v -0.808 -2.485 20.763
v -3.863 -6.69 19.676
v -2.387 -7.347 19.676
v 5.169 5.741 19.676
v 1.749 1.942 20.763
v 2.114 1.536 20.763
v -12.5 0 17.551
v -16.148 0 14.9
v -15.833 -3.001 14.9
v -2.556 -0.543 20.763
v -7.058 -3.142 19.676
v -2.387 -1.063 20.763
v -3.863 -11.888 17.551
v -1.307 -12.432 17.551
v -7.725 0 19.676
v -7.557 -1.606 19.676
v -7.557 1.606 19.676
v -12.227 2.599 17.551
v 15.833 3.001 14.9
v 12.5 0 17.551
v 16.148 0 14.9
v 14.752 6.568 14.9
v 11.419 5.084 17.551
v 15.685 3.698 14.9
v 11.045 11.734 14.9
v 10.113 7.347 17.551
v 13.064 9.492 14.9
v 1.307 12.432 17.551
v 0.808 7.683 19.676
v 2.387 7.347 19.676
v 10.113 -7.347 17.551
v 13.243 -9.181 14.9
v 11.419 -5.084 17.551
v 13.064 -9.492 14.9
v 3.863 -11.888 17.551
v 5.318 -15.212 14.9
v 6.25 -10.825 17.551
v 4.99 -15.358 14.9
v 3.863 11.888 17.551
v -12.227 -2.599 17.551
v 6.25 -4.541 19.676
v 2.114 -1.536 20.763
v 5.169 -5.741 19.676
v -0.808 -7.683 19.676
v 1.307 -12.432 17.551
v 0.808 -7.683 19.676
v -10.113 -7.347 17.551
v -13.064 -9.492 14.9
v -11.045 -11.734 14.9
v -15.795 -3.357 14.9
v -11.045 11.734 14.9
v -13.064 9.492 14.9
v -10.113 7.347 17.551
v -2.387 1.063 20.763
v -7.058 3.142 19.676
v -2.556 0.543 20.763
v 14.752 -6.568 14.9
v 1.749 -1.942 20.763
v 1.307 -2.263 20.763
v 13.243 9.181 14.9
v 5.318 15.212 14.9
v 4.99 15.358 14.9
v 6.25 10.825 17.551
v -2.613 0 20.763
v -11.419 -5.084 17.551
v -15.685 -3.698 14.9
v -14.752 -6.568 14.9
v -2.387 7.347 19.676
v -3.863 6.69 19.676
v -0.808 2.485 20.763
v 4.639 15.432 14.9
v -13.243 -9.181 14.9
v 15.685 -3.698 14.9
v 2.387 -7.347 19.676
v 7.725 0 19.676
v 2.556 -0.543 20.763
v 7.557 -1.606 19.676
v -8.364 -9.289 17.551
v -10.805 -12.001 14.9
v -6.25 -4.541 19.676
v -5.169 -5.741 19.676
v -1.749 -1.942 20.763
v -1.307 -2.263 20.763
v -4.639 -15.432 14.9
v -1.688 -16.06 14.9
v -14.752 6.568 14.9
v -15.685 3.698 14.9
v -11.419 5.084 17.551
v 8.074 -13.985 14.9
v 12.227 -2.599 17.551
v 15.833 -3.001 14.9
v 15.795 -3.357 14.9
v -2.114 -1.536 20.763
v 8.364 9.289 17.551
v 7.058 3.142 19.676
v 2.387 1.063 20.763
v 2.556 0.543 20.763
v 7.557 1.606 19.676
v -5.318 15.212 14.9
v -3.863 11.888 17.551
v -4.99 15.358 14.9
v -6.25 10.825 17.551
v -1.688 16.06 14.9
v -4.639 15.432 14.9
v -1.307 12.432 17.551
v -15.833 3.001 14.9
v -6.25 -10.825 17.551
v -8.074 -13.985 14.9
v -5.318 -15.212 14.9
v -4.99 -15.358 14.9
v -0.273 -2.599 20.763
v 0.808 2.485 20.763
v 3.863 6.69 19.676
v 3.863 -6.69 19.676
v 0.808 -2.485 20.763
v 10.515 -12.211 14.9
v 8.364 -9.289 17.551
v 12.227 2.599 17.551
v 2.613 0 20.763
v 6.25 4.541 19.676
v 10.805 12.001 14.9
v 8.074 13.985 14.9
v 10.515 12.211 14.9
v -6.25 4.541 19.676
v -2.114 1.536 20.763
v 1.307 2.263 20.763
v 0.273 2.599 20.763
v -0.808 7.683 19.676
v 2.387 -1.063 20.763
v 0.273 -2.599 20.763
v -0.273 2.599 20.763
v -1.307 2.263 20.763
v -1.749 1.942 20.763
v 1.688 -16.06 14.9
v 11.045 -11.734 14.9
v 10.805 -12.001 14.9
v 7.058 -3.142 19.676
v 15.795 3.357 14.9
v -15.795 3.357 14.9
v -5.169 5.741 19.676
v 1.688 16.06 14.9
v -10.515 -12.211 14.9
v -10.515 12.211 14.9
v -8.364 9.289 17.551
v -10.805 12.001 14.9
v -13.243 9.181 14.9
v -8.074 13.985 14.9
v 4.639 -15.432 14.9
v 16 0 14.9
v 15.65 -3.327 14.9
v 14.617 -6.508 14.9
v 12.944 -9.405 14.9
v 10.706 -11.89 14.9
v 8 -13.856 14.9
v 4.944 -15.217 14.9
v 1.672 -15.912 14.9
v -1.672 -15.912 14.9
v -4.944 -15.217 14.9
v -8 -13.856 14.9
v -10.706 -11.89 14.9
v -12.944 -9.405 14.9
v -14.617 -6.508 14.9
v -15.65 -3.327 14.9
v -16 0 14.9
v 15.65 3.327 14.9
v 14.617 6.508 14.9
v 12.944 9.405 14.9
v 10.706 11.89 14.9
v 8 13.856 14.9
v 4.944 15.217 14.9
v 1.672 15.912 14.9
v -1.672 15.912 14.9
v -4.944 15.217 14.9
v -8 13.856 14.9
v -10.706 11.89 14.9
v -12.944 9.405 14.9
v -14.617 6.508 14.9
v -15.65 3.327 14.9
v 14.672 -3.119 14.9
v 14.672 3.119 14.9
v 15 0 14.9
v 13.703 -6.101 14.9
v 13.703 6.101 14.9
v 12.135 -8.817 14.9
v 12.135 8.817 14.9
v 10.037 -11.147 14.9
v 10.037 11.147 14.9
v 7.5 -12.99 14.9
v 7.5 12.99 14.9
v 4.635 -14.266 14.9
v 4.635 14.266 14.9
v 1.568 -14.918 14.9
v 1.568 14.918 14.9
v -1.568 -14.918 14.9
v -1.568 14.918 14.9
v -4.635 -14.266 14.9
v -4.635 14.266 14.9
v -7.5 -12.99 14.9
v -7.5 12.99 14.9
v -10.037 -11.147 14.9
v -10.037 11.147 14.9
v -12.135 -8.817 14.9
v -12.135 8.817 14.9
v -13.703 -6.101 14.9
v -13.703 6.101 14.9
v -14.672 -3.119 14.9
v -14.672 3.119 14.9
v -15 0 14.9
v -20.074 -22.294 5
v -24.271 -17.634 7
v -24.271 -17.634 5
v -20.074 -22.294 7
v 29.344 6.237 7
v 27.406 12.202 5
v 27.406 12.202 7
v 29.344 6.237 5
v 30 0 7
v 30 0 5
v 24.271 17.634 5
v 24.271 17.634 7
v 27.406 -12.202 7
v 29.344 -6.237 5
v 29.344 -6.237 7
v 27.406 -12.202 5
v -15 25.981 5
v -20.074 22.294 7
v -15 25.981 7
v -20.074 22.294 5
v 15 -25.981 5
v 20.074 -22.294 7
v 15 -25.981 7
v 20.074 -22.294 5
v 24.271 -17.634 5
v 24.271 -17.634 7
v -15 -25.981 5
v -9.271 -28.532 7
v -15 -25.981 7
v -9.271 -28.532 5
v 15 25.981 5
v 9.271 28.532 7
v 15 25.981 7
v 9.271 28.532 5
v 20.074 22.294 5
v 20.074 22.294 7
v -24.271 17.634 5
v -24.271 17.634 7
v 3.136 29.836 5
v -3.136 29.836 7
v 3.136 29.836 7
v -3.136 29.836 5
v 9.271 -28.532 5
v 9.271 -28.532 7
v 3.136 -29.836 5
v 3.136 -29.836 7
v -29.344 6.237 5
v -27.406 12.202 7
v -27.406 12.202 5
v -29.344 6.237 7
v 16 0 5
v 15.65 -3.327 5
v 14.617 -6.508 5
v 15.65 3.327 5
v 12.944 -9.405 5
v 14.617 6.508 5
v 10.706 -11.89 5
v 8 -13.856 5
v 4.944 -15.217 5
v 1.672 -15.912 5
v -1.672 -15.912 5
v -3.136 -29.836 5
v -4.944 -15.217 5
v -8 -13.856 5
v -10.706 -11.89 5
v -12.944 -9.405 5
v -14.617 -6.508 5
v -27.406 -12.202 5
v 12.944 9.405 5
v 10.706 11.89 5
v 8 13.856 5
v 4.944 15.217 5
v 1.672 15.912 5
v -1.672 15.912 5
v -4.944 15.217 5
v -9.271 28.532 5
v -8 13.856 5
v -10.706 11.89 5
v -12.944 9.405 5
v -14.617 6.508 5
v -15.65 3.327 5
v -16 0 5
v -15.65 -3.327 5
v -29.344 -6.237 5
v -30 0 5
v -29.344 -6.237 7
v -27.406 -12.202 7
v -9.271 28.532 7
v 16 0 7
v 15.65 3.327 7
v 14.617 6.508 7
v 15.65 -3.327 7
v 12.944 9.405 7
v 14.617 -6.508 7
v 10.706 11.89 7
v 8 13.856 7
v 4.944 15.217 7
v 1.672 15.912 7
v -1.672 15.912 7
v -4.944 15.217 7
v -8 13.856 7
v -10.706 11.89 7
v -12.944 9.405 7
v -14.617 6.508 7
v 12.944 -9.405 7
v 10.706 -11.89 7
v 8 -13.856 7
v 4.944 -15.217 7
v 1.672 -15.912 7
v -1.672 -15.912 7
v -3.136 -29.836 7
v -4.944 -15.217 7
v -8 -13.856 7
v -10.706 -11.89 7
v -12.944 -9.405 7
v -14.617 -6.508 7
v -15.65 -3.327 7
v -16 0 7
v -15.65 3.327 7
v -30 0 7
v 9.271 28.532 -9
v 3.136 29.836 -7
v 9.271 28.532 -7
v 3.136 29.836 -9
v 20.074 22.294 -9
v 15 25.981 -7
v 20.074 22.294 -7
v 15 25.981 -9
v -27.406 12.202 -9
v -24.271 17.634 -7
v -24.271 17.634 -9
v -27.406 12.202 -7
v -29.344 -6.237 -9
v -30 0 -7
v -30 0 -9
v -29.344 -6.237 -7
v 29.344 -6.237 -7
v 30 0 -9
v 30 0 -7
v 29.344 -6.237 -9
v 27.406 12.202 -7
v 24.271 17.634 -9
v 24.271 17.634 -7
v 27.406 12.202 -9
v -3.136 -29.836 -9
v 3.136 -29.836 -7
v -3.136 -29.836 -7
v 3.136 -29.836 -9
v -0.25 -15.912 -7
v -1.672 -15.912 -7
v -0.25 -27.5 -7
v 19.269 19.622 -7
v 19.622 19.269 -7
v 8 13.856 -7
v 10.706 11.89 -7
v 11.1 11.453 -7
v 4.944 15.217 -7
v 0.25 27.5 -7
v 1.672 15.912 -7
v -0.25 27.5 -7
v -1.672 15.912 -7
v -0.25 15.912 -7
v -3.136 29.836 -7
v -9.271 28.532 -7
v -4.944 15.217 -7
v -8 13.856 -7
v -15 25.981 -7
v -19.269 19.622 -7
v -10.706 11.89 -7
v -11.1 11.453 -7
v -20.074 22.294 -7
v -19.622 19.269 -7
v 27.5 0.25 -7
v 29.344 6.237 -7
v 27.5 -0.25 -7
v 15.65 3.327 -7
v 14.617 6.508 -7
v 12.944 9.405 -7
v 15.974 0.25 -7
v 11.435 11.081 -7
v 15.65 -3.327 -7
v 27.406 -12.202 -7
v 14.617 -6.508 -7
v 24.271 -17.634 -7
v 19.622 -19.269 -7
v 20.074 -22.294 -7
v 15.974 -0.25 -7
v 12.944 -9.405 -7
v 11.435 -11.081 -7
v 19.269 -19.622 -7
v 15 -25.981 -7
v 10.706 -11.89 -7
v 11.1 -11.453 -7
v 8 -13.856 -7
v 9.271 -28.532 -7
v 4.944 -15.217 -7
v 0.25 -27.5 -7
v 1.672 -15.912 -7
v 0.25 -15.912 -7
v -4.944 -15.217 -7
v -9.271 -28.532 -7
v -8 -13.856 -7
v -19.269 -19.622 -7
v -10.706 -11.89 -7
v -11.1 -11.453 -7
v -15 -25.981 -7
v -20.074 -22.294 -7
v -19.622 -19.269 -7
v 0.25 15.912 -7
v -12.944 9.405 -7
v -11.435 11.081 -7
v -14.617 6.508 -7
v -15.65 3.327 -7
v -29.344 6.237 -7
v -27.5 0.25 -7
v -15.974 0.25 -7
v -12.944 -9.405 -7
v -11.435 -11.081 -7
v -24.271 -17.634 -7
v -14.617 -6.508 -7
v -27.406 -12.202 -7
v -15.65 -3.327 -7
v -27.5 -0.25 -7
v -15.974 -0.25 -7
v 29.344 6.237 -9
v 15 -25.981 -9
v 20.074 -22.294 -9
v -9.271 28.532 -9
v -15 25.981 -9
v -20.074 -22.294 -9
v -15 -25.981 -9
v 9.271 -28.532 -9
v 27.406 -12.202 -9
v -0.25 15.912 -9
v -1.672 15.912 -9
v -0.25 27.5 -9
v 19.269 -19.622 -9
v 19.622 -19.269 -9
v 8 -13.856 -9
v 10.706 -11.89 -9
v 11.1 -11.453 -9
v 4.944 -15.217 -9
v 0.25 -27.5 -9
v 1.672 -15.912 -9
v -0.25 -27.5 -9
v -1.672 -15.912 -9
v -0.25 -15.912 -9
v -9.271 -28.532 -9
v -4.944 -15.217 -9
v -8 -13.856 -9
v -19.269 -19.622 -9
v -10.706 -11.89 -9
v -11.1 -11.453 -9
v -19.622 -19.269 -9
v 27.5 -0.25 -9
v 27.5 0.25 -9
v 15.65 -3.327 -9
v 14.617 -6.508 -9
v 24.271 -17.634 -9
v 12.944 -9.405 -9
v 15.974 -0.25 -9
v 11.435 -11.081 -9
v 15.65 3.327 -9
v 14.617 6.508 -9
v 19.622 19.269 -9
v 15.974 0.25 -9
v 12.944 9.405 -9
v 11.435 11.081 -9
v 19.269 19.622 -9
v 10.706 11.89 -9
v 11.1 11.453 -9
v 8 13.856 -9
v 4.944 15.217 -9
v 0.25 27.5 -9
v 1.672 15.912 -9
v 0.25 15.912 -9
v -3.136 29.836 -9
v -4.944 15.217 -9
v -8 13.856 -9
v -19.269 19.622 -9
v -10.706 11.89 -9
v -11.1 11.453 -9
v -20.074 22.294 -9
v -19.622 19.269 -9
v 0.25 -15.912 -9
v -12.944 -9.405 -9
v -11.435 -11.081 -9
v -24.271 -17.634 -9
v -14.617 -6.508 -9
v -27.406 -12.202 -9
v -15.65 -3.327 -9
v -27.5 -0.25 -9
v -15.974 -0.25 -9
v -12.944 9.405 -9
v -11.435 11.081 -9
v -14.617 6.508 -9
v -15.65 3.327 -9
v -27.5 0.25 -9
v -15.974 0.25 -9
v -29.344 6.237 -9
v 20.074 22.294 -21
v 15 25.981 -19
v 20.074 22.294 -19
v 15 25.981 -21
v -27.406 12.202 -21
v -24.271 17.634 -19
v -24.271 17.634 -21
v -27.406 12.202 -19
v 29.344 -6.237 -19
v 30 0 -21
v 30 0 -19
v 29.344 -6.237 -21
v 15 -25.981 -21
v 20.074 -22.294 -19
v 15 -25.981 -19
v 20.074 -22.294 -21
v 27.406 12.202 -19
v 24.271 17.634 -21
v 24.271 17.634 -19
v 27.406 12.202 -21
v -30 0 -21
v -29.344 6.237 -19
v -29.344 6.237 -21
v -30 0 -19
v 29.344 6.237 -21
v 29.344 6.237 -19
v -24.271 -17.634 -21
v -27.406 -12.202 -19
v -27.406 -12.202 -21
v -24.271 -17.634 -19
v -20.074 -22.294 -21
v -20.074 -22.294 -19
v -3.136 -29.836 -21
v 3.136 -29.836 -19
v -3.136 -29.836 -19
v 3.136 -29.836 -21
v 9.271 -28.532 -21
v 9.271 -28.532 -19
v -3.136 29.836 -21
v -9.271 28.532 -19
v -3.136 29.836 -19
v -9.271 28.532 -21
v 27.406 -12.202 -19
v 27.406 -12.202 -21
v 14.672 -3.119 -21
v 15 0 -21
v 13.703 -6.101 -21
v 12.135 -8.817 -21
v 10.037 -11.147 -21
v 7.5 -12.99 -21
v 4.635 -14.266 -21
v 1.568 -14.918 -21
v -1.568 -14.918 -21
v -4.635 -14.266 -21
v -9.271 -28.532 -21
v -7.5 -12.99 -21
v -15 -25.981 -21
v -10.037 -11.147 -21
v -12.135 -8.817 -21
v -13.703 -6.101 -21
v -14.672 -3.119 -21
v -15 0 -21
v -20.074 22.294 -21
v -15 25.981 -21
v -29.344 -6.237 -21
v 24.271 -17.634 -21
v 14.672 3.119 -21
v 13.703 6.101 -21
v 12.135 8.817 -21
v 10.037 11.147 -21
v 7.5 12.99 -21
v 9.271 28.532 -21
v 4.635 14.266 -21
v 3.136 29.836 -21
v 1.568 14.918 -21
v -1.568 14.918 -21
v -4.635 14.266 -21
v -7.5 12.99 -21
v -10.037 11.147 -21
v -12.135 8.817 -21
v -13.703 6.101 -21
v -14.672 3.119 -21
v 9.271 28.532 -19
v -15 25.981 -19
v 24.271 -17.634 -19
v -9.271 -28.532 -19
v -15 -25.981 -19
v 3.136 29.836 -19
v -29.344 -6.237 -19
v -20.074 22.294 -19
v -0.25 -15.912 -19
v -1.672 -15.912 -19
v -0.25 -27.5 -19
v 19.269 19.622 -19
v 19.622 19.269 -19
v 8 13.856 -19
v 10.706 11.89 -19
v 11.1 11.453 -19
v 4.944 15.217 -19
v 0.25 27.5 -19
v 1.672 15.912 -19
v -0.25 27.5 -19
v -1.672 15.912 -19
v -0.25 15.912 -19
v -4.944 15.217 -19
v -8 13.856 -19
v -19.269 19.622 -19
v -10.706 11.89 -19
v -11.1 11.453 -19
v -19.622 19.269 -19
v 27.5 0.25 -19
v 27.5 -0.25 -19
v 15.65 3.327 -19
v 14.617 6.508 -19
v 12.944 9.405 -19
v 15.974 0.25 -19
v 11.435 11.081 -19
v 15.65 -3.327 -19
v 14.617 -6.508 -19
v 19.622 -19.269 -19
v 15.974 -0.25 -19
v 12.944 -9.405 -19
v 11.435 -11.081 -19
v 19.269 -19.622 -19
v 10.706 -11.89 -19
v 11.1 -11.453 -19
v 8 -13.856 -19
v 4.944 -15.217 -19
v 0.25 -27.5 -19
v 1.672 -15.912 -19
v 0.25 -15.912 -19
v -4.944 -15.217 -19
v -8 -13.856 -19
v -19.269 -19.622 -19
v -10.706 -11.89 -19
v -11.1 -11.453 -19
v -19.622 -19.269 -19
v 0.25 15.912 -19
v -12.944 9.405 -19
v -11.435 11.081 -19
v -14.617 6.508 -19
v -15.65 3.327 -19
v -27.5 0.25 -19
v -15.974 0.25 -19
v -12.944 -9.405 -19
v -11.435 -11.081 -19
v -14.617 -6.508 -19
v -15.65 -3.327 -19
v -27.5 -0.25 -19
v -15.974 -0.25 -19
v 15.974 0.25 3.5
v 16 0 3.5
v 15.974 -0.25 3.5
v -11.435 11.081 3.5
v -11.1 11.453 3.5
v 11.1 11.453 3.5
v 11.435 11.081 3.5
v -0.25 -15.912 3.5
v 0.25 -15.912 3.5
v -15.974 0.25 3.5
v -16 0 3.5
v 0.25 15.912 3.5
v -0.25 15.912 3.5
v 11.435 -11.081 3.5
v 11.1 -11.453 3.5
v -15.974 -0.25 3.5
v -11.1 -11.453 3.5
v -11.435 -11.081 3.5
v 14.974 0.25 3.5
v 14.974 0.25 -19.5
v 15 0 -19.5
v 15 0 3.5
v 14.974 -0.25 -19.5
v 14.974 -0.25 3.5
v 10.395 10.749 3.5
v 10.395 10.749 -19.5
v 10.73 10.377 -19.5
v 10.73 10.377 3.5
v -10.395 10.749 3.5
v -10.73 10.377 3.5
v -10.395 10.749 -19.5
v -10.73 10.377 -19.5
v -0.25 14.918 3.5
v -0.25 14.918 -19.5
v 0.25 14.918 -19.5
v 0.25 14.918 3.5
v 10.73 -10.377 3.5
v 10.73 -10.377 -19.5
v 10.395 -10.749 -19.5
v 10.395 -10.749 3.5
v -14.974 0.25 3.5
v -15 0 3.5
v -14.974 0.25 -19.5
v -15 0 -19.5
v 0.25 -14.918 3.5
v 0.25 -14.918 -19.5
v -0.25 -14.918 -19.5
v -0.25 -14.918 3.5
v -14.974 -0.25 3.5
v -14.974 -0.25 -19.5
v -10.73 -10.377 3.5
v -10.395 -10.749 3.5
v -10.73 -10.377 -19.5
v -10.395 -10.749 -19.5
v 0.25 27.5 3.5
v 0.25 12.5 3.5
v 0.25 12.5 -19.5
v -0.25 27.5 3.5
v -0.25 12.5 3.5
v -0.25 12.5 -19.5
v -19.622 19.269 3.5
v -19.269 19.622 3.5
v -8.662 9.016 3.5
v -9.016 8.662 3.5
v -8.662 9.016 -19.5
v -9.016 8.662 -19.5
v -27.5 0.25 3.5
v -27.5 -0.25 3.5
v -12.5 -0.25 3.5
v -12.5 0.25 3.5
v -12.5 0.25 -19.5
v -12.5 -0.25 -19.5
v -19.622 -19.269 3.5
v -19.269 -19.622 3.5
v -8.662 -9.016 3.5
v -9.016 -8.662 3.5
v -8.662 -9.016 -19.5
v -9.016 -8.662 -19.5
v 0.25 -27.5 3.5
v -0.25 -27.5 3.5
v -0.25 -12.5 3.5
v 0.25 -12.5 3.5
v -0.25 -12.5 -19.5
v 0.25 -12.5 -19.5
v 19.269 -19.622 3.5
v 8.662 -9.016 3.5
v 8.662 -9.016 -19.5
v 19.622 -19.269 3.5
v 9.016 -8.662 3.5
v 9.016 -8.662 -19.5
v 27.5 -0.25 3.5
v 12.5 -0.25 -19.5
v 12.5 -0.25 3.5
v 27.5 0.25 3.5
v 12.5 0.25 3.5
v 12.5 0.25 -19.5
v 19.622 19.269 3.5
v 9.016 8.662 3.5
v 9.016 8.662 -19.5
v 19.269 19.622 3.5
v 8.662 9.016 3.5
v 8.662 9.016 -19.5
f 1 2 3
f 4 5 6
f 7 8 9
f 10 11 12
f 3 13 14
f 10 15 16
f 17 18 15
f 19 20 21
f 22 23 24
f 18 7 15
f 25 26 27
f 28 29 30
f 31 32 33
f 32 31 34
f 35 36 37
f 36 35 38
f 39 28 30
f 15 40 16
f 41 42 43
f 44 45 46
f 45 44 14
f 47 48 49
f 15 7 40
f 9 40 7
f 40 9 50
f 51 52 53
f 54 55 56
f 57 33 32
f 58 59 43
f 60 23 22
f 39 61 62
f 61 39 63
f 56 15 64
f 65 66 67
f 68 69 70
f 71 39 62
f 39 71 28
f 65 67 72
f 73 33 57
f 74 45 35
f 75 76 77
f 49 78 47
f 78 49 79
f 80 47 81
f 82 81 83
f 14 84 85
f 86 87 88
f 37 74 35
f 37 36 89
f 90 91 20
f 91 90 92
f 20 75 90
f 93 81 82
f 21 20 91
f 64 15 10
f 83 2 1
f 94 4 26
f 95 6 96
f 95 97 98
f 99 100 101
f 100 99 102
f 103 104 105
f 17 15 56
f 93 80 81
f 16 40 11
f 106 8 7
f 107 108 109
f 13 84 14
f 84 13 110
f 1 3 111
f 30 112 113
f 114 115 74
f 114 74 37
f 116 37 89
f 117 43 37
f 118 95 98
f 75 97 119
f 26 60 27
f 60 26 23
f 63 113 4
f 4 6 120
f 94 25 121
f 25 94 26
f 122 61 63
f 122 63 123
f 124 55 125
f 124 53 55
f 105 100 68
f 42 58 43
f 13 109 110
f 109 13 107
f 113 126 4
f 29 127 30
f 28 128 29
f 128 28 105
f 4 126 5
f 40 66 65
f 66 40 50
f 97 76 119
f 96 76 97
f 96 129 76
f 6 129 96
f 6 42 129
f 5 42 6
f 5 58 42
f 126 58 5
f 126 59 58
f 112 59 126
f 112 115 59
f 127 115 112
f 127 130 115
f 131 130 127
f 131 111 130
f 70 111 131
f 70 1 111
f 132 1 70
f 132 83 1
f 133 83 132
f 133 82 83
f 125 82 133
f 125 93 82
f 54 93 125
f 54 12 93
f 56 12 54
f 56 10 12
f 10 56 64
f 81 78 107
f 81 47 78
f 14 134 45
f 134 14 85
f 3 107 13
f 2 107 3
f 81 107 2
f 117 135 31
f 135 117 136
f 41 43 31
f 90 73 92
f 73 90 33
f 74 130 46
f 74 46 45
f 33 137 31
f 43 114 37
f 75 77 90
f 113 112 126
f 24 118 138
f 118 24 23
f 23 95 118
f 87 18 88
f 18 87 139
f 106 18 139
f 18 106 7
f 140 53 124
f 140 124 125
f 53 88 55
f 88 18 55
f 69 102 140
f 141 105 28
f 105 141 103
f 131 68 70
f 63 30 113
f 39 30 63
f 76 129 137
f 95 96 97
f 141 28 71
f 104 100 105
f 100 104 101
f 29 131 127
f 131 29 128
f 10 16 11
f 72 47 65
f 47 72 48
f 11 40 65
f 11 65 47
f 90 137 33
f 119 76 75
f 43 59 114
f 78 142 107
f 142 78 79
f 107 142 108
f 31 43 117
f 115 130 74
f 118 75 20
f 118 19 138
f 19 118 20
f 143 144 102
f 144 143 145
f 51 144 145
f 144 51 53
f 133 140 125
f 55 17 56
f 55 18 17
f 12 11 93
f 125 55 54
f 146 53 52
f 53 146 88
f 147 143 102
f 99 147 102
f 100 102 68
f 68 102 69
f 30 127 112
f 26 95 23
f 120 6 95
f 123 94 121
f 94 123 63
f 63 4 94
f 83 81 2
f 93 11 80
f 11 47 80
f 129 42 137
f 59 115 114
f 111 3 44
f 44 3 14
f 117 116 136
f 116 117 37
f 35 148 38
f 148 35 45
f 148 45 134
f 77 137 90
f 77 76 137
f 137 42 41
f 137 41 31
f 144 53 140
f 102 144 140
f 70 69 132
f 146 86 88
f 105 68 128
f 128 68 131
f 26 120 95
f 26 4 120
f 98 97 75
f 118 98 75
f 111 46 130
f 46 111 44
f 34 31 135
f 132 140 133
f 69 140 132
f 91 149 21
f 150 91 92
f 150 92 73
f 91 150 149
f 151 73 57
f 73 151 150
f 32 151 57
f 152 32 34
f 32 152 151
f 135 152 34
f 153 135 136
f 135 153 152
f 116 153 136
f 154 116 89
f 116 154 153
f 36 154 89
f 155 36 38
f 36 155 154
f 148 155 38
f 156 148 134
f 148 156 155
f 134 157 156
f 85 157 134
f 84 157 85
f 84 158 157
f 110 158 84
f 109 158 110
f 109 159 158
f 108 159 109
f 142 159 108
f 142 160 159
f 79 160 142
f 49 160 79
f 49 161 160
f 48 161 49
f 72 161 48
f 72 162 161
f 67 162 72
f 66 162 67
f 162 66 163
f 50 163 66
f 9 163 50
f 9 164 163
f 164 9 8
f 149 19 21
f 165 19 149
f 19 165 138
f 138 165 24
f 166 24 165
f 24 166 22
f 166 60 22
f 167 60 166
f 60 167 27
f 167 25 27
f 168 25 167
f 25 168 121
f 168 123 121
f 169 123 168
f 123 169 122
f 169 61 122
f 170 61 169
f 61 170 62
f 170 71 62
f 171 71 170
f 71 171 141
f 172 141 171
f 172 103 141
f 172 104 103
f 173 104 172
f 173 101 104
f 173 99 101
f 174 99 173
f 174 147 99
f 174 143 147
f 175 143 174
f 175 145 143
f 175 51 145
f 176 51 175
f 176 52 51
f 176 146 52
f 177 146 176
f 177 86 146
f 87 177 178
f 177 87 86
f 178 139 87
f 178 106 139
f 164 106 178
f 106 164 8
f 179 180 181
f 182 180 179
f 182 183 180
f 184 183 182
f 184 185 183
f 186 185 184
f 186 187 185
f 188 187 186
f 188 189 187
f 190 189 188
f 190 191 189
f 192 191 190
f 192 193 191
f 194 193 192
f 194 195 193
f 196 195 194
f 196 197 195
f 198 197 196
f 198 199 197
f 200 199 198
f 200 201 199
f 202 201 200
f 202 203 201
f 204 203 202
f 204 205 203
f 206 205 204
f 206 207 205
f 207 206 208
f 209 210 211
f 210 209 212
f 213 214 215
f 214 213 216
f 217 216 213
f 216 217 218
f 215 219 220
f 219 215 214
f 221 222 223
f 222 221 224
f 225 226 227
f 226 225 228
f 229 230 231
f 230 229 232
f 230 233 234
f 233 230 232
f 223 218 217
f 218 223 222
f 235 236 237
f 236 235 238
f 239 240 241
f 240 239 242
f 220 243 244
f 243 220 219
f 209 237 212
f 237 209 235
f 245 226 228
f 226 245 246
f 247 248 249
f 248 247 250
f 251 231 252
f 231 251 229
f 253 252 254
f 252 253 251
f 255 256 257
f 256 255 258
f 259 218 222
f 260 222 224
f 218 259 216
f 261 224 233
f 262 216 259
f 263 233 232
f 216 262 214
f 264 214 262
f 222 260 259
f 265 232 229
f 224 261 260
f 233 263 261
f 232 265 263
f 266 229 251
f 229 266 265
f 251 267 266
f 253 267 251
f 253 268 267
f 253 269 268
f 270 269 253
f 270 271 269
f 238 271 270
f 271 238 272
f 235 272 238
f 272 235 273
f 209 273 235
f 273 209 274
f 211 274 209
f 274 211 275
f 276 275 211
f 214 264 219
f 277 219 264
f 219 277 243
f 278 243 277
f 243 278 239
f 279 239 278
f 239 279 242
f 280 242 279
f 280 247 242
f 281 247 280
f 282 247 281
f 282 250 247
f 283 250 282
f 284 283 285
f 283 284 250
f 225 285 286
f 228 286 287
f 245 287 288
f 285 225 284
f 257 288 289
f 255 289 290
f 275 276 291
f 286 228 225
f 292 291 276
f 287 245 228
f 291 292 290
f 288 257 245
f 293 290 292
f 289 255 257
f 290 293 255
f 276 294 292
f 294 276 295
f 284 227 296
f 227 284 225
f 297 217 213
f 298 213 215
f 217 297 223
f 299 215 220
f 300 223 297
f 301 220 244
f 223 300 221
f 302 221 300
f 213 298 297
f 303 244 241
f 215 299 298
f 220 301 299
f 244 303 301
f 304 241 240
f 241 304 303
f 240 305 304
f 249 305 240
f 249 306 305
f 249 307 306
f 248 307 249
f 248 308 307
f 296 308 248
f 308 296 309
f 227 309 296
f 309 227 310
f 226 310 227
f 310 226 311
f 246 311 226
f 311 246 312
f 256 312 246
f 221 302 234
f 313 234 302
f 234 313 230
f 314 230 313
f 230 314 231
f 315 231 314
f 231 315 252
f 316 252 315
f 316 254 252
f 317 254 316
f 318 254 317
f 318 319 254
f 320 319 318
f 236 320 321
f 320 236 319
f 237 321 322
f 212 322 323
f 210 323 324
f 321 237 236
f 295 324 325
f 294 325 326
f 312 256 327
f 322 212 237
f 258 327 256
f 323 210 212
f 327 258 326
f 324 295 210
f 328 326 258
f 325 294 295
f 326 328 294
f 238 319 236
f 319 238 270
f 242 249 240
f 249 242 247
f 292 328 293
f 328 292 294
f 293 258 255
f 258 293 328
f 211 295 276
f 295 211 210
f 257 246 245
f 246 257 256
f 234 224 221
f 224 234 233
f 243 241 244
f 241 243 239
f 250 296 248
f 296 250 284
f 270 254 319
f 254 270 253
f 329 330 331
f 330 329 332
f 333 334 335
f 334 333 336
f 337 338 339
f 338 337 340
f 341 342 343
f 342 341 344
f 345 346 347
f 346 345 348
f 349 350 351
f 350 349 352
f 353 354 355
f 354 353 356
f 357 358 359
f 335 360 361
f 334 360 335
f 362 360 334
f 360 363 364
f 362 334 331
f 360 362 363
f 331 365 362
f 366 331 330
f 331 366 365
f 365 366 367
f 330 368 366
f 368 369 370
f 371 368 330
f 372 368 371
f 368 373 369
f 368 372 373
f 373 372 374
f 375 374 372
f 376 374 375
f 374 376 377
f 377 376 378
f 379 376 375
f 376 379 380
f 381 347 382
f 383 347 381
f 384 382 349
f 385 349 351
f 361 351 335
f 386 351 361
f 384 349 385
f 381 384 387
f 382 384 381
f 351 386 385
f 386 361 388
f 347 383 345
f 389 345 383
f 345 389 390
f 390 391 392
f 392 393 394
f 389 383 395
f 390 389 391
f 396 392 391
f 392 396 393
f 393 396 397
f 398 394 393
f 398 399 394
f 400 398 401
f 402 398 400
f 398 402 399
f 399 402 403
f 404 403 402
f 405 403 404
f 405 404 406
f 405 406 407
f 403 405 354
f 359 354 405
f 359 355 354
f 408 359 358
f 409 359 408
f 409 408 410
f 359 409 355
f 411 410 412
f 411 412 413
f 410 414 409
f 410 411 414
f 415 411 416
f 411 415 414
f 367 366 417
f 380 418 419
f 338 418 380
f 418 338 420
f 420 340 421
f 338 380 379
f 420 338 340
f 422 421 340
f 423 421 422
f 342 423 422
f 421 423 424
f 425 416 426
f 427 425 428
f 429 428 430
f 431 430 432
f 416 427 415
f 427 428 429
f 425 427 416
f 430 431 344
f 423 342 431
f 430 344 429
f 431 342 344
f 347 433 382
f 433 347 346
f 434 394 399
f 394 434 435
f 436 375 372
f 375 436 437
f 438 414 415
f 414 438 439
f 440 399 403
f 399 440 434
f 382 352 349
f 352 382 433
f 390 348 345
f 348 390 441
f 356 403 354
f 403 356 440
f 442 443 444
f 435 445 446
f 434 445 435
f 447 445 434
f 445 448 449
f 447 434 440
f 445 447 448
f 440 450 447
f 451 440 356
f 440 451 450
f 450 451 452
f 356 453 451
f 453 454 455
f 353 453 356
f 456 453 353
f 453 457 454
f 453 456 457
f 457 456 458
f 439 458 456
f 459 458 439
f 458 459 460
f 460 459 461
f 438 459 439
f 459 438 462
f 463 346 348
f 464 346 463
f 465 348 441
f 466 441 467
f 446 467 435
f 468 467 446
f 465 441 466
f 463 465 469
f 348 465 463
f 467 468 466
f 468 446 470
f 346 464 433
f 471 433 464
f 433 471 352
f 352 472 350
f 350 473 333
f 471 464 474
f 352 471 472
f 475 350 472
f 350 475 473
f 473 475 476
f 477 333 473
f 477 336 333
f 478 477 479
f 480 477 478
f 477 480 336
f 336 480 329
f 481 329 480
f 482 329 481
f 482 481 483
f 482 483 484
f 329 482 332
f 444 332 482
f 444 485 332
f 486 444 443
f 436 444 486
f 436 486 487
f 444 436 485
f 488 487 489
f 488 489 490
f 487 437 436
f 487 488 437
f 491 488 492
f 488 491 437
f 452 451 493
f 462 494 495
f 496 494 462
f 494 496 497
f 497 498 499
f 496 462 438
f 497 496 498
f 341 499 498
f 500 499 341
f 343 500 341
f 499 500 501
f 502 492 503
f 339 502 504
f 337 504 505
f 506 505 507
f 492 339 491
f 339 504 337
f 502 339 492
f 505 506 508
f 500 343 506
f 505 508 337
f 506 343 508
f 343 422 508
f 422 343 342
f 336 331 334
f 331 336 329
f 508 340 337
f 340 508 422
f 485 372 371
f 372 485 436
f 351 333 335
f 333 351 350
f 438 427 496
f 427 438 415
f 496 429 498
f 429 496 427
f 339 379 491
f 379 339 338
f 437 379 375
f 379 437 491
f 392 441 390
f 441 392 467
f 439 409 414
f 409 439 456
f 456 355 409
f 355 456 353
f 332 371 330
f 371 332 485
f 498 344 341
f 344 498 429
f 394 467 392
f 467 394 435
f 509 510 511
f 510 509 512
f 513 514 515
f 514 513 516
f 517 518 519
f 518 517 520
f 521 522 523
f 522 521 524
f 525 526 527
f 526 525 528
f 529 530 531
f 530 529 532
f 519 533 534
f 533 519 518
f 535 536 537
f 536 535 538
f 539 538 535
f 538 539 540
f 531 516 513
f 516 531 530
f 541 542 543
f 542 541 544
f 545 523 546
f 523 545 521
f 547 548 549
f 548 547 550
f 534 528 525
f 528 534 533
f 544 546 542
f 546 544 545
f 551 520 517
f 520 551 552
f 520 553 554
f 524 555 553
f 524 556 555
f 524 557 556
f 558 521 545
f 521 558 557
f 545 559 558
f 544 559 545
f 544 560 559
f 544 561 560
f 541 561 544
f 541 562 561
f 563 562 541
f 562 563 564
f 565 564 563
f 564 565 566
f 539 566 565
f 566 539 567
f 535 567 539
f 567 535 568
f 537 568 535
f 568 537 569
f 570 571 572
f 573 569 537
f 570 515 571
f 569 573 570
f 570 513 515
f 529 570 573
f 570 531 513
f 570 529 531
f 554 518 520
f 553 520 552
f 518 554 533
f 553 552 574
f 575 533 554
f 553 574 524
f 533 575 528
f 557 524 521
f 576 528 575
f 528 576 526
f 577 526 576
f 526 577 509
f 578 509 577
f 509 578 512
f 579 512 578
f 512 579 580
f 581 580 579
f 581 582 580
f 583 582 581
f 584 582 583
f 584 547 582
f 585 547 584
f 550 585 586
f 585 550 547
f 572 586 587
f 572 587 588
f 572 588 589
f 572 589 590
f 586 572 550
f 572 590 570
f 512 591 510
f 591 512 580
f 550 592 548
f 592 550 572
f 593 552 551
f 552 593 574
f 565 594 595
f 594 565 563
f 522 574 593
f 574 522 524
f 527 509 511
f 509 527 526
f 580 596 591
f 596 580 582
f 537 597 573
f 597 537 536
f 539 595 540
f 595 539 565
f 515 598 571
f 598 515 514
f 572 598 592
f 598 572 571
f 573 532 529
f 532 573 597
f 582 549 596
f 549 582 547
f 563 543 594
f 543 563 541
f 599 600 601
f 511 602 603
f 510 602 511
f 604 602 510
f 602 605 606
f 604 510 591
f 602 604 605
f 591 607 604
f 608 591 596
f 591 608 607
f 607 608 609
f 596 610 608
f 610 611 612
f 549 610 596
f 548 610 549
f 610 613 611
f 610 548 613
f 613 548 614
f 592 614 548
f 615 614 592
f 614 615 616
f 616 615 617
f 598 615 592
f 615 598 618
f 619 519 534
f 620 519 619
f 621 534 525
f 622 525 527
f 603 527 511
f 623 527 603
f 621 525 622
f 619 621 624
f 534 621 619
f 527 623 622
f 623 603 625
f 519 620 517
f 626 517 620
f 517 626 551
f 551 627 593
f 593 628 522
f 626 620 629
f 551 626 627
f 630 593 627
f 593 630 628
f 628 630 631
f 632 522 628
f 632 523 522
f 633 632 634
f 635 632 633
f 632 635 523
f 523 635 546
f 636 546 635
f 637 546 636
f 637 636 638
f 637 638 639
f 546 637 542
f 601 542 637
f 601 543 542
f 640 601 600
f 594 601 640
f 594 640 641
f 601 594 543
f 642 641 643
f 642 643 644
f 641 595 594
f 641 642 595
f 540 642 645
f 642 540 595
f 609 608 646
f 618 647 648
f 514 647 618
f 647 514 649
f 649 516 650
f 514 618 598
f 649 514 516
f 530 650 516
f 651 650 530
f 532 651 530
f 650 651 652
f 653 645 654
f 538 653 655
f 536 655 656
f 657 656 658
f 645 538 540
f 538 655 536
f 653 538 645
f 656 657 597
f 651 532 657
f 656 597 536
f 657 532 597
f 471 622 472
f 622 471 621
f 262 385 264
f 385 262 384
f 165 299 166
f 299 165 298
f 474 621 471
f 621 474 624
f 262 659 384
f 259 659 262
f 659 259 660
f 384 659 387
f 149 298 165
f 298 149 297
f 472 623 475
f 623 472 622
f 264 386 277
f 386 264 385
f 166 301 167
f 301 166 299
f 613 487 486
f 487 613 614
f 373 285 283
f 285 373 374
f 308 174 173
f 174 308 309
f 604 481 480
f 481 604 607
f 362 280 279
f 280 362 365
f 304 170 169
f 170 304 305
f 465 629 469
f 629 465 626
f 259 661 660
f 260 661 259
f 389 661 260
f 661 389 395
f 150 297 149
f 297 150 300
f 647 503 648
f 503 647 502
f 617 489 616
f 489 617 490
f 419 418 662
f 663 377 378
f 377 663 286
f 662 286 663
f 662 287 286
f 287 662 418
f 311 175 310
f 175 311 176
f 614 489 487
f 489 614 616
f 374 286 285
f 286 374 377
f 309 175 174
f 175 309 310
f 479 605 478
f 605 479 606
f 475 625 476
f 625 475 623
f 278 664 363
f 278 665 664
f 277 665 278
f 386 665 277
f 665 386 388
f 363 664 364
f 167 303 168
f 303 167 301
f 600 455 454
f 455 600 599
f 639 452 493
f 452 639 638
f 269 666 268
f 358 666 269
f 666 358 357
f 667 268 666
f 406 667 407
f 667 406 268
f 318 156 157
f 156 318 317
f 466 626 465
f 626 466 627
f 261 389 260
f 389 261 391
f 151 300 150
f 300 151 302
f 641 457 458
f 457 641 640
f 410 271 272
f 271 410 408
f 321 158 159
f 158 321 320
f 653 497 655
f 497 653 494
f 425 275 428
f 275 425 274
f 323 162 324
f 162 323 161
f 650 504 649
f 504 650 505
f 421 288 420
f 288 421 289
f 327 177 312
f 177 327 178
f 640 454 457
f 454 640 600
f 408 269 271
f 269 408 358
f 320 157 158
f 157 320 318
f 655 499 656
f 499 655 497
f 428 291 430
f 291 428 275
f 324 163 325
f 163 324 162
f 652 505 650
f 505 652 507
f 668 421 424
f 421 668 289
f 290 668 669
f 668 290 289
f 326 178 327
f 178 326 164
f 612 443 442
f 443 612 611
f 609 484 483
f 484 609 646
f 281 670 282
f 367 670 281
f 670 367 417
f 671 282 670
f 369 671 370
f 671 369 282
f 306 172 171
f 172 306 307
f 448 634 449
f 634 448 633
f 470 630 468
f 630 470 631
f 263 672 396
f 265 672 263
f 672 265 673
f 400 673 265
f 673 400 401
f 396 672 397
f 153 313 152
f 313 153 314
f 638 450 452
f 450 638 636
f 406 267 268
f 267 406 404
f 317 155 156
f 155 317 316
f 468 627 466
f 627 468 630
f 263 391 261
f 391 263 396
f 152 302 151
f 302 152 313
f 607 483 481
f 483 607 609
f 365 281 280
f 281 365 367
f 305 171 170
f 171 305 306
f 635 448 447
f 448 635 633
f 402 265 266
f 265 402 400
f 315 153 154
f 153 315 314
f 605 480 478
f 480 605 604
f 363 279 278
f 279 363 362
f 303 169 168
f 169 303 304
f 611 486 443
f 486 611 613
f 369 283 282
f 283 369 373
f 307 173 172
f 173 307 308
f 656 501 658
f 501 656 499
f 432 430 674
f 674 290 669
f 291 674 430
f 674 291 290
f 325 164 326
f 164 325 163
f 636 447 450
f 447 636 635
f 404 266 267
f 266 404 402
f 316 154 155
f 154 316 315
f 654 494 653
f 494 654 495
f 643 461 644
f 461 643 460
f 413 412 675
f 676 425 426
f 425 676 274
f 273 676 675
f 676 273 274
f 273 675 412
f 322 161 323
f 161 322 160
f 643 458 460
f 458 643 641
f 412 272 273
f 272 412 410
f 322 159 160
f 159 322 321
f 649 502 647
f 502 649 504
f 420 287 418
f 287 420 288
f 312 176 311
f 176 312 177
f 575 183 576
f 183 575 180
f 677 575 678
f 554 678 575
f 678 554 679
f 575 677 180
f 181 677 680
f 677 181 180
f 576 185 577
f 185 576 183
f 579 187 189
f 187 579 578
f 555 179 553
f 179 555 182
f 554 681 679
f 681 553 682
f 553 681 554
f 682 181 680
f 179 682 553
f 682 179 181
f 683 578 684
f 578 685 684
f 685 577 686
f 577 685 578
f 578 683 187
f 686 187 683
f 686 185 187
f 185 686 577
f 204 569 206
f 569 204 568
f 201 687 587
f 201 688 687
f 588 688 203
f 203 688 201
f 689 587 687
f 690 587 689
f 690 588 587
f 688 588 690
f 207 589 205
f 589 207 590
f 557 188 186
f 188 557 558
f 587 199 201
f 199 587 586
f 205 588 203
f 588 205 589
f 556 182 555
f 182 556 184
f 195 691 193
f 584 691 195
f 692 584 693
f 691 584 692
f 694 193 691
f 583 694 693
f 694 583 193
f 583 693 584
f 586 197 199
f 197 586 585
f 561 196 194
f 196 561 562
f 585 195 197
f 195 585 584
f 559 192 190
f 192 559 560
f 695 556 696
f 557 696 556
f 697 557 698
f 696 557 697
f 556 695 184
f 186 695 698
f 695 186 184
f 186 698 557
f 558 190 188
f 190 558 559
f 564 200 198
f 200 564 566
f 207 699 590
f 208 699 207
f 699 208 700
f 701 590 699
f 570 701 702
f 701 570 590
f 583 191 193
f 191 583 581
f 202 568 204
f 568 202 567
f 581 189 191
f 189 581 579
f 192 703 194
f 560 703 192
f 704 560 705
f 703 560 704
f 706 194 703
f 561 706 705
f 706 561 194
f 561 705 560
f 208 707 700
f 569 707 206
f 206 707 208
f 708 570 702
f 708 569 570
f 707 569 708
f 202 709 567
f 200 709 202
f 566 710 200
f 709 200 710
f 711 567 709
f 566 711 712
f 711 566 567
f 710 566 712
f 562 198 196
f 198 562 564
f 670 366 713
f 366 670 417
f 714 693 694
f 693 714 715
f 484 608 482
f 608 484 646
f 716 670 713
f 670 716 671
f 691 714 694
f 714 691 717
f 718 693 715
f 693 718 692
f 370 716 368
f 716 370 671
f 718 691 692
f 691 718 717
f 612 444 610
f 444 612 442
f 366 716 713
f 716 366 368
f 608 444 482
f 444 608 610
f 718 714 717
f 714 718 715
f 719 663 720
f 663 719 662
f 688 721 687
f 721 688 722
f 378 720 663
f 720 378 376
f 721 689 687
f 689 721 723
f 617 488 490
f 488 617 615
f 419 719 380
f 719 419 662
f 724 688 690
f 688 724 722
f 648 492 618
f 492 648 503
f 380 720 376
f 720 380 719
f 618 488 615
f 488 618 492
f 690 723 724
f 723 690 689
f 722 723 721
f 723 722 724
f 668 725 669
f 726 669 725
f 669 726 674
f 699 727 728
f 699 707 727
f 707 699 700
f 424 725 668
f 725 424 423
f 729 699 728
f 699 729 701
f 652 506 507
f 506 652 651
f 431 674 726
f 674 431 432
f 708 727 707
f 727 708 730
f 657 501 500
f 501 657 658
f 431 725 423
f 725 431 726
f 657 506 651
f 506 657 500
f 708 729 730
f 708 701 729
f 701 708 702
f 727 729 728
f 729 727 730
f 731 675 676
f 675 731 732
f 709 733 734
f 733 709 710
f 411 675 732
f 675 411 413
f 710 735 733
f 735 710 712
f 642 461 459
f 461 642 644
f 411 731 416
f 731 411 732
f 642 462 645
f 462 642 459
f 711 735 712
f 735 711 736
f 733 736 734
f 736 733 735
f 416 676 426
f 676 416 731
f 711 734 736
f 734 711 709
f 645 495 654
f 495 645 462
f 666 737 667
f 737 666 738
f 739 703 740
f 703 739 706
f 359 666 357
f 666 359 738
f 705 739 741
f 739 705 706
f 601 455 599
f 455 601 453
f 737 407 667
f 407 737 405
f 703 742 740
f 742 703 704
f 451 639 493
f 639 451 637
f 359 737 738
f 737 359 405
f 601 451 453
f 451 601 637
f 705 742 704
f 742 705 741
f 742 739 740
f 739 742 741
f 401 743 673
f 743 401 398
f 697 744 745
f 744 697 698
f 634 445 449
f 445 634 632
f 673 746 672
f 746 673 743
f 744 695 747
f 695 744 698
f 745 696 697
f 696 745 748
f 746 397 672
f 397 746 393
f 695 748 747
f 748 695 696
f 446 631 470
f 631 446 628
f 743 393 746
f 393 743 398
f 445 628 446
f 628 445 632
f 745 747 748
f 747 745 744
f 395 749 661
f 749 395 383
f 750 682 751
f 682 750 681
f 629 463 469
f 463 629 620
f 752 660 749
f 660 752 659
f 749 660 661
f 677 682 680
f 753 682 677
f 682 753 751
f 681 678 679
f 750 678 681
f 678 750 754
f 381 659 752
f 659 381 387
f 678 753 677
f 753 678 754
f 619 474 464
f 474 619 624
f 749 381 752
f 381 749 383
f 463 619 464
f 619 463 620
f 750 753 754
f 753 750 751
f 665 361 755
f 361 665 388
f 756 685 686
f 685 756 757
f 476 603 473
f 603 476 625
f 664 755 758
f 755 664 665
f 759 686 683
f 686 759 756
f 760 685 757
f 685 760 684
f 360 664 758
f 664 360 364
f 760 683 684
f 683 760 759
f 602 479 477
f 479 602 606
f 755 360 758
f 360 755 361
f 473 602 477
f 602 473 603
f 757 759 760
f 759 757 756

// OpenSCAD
translate([0,0,-4.1])  difference()
{
sphere(25);
translate([0,0,-6])  
  cube([50,50,50], true);
}
difference()
{
  union(){
    translate([0,0,6]) cylinder(2,30,30, true);
    translate([0,0,-8]) cylinder(2,30,30, true);
    translate([0,0,-20])cylinder(2,30,30, true);
    
    translate([0,0,-3])  cylinder(36,16,16, true);
  }
// for(d = [0 : 90 : 360]){
//   rotate([0,0,d])   translate([-d/40,182,-125])  cylinder(15,d/70,d/70);
//   rotate([0,0,d])   translate([d/40,182,-125])  cylinder(15,d/70,d/70);
//  
// }
 translate([0,282,-125])  cylinder(15,3,3,true);
translate([0,0,-15])  cylinder(121,15,15, true);
}
 for(a = [0 : 45 : 360]){
   rotate([0,0,a]) color("blue") translate([0,20,-8]) cube([0.5,15,23], true);
   }
//   
//   
//    for(b = [0 : 45 : 360]){
//   rotate([0,0,b]) color("blue") translate([0,150,30])cube([10,10,295], true);
//   }
//   
//   for(c = [-45 : 90 : 360]){
//   rotate([0,0,c]) color("blue") translate([0,165,-127])cube(16, true);
//   }
//   
//
//translate([0,0,170]) difference(){
// cylinder(20,25,25, true);
//   cylinder(22,20,20, true);
//}
